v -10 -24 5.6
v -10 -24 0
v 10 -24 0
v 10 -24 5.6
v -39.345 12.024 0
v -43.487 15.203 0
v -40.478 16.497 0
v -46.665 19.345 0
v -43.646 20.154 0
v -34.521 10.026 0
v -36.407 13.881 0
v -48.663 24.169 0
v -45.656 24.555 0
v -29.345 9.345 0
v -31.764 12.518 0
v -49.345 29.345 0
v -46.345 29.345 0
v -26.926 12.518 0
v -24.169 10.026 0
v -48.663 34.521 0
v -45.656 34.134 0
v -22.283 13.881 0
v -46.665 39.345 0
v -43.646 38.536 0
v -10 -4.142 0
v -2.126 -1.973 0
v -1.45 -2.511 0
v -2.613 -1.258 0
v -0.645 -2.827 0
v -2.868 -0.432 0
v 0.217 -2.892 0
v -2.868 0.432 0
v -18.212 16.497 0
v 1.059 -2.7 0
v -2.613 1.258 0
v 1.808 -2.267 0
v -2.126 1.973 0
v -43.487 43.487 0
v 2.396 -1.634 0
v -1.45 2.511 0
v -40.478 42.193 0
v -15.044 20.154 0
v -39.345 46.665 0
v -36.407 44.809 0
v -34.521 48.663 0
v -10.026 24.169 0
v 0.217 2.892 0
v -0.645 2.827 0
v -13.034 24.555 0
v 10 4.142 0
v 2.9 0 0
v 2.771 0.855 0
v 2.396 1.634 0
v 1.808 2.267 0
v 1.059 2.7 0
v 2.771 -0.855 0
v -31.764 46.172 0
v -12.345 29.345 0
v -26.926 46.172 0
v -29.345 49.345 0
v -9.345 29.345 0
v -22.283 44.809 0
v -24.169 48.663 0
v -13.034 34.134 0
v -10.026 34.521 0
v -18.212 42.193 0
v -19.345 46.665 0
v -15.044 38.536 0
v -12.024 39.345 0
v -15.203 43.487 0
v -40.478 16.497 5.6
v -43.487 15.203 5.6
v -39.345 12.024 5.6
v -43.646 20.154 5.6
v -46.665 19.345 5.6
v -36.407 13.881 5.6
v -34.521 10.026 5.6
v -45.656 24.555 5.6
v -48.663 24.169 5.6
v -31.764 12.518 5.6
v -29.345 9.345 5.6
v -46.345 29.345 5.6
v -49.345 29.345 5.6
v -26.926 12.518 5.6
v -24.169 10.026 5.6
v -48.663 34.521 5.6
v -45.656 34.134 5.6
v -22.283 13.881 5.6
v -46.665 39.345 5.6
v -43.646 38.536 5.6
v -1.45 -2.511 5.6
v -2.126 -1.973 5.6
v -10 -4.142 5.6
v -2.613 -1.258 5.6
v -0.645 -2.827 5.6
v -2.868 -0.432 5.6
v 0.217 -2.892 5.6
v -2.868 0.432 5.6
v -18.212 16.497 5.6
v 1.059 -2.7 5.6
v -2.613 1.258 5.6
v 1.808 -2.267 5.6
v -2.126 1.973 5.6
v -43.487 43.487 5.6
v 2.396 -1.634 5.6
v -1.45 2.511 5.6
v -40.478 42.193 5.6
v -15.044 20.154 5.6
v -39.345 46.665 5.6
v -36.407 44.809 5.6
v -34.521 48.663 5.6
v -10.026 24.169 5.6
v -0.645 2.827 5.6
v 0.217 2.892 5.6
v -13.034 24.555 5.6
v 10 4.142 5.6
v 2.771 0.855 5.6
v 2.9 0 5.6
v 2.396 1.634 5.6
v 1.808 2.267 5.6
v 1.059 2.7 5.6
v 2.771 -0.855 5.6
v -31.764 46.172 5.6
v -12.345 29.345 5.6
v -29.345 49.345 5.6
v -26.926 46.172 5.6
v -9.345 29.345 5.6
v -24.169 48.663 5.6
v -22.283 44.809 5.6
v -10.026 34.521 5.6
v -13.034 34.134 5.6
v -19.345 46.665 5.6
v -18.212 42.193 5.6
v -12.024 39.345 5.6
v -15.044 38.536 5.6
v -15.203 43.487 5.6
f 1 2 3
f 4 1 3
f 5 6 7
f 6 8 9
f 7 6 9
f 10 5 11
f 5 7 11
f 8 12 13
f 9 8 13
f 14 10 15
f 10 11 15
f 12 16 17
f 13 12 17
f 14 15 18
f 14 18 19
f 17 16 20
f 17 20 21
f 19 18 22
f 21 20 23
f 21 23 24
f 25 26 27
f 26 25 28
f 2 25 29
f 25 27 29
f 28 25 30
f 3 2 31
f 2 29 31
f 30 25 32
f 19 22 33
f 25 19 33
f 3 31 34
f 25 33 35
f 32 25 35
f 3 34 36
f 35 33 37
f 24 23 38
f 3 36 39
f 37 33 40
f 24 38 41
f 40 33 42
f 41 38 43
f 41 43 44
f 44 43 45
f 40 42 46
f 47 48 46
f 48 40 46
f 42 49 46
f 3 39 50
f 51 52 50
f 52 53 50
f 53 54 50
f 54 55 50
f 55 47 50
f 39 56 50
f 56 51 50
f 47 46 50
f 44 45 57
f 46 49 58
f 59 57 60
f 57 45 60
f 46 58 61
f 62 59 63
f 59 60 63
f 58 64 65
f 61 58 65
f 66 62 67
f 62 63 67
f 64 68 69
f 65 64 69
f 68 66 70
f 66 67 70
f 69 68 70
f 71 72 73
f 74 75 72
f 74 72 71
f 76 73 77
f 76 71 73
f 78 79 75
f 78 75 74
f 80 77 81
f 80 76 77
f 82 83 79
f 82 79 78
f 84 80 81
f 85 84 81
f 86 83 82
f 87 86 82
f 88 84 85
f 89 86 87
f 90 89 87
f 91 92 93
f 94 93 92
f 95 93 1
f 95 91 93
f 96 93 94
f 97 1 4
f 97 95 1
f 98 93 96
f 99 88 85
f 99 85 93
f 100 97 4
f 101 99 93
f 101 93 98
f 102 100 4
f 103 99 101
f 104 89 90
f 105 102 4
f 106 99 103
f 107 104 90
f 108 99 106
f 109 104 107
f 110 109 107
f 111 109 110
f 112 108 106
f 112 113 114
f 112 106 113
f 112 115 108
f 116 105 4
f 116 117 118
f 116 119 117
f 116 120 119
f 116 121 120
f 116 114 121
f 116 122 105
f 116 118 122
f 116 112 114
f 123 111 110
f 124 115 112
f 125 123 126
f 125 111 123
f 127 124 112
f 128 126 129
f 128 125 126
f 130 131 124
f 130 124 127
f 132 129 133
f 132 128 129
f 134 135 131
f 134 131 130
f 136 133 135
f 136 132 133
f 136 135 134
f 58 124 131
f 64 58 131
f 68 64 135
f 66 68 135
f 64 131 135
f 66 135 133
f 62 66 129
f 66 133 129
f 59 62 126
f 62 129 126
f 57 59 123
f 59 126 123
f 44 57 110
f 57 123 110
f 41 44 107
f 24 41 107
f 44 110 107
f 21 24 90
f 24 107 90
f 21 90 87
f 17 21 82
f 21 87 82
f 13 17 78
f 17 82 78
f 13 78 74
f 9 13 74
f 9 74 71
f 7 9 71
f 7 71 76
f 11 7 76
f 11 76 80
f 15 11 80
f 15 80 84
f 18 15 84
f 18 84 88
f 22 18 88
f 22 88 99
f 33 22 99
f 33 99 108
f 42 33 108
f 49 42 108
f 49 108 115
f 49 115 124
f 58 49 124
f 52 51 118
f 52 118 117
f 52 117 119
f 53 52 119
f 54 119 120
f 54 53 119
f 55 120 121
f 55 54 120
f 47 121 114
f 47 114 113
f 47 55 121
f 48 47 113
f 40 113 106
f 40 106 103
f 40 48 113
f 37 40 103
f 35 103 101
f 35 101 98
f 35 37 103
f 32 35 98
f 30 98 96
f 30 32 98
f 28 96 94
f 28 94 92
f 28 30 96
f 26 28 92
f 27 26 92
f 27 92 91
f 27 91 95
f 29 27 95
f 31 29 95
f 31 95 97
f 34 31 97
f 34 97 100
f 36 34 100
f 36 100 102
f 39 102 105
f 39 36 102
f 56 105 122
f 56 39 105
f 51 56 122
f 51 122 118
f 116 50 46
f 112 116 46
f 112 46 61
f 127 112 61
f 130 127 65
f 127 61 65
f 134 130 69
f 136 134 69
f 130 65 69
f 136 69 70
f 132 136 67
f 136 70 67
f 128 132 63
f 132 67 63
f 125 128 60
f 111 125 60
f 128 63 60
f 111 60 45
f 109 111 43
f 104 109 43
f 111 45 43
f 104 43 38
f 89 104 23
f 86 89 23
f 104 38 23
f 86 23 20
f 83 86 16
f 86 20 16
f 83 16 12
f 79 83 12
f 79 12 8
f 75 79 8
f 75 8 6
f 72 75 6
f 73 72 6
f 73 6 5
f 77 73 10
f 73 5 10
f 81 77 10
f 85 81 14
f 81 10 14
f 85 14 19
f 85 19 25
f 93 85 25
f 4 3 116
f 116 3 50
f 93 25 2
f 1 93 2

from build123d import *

# Parameters (mm, degrees)
SKETCH1_R           = 2.9
BOSS_EXTRUDE1_DEPTH = 5.6
SKETCH2_R           = 17
CUT_EXTRUDE1_DEPTH  = 71.008603139


with BuildPart() as part:
    # Sketch1 → Boss-Extrude1 (new body)
    with BuildSketch(Plane.XY):
        with BuildLine():
            Line((-10, -4.142135624), (-10, -24))
            Line((-10, -24), (10, -24))
            Line((10, -24), (10, 4.142135624))
            Line((10, 4.142135624), (-10.026414893, 24.168550517))
            ThreePointArc((-10.026414893, 24.168550517), (-43.487067043, 43.487067043), (-24.168550517, 10.026414893))
            Line((-24.168550517, 10.026414893), (-10, -4.142135624))
        make_face()
        Circle(SKETCH1_R, mode=Mode.SUBTRACT)
    extrude(amount=BOSS_EXTRUDE1_DEPTH)

    # Sketch2 → Cut-Extrude1 (cut, through all)
    with BuildSketch(Plane.XY.offset(5.6)):
        with Locations((-29.344931419, 29.344931419)):
            Circle(SKETCH2_R)
    extrude(amount=-CUT_EXTRUDE1_DEPTH, mode=Mode.SUBTRACT)


solid = part.part
